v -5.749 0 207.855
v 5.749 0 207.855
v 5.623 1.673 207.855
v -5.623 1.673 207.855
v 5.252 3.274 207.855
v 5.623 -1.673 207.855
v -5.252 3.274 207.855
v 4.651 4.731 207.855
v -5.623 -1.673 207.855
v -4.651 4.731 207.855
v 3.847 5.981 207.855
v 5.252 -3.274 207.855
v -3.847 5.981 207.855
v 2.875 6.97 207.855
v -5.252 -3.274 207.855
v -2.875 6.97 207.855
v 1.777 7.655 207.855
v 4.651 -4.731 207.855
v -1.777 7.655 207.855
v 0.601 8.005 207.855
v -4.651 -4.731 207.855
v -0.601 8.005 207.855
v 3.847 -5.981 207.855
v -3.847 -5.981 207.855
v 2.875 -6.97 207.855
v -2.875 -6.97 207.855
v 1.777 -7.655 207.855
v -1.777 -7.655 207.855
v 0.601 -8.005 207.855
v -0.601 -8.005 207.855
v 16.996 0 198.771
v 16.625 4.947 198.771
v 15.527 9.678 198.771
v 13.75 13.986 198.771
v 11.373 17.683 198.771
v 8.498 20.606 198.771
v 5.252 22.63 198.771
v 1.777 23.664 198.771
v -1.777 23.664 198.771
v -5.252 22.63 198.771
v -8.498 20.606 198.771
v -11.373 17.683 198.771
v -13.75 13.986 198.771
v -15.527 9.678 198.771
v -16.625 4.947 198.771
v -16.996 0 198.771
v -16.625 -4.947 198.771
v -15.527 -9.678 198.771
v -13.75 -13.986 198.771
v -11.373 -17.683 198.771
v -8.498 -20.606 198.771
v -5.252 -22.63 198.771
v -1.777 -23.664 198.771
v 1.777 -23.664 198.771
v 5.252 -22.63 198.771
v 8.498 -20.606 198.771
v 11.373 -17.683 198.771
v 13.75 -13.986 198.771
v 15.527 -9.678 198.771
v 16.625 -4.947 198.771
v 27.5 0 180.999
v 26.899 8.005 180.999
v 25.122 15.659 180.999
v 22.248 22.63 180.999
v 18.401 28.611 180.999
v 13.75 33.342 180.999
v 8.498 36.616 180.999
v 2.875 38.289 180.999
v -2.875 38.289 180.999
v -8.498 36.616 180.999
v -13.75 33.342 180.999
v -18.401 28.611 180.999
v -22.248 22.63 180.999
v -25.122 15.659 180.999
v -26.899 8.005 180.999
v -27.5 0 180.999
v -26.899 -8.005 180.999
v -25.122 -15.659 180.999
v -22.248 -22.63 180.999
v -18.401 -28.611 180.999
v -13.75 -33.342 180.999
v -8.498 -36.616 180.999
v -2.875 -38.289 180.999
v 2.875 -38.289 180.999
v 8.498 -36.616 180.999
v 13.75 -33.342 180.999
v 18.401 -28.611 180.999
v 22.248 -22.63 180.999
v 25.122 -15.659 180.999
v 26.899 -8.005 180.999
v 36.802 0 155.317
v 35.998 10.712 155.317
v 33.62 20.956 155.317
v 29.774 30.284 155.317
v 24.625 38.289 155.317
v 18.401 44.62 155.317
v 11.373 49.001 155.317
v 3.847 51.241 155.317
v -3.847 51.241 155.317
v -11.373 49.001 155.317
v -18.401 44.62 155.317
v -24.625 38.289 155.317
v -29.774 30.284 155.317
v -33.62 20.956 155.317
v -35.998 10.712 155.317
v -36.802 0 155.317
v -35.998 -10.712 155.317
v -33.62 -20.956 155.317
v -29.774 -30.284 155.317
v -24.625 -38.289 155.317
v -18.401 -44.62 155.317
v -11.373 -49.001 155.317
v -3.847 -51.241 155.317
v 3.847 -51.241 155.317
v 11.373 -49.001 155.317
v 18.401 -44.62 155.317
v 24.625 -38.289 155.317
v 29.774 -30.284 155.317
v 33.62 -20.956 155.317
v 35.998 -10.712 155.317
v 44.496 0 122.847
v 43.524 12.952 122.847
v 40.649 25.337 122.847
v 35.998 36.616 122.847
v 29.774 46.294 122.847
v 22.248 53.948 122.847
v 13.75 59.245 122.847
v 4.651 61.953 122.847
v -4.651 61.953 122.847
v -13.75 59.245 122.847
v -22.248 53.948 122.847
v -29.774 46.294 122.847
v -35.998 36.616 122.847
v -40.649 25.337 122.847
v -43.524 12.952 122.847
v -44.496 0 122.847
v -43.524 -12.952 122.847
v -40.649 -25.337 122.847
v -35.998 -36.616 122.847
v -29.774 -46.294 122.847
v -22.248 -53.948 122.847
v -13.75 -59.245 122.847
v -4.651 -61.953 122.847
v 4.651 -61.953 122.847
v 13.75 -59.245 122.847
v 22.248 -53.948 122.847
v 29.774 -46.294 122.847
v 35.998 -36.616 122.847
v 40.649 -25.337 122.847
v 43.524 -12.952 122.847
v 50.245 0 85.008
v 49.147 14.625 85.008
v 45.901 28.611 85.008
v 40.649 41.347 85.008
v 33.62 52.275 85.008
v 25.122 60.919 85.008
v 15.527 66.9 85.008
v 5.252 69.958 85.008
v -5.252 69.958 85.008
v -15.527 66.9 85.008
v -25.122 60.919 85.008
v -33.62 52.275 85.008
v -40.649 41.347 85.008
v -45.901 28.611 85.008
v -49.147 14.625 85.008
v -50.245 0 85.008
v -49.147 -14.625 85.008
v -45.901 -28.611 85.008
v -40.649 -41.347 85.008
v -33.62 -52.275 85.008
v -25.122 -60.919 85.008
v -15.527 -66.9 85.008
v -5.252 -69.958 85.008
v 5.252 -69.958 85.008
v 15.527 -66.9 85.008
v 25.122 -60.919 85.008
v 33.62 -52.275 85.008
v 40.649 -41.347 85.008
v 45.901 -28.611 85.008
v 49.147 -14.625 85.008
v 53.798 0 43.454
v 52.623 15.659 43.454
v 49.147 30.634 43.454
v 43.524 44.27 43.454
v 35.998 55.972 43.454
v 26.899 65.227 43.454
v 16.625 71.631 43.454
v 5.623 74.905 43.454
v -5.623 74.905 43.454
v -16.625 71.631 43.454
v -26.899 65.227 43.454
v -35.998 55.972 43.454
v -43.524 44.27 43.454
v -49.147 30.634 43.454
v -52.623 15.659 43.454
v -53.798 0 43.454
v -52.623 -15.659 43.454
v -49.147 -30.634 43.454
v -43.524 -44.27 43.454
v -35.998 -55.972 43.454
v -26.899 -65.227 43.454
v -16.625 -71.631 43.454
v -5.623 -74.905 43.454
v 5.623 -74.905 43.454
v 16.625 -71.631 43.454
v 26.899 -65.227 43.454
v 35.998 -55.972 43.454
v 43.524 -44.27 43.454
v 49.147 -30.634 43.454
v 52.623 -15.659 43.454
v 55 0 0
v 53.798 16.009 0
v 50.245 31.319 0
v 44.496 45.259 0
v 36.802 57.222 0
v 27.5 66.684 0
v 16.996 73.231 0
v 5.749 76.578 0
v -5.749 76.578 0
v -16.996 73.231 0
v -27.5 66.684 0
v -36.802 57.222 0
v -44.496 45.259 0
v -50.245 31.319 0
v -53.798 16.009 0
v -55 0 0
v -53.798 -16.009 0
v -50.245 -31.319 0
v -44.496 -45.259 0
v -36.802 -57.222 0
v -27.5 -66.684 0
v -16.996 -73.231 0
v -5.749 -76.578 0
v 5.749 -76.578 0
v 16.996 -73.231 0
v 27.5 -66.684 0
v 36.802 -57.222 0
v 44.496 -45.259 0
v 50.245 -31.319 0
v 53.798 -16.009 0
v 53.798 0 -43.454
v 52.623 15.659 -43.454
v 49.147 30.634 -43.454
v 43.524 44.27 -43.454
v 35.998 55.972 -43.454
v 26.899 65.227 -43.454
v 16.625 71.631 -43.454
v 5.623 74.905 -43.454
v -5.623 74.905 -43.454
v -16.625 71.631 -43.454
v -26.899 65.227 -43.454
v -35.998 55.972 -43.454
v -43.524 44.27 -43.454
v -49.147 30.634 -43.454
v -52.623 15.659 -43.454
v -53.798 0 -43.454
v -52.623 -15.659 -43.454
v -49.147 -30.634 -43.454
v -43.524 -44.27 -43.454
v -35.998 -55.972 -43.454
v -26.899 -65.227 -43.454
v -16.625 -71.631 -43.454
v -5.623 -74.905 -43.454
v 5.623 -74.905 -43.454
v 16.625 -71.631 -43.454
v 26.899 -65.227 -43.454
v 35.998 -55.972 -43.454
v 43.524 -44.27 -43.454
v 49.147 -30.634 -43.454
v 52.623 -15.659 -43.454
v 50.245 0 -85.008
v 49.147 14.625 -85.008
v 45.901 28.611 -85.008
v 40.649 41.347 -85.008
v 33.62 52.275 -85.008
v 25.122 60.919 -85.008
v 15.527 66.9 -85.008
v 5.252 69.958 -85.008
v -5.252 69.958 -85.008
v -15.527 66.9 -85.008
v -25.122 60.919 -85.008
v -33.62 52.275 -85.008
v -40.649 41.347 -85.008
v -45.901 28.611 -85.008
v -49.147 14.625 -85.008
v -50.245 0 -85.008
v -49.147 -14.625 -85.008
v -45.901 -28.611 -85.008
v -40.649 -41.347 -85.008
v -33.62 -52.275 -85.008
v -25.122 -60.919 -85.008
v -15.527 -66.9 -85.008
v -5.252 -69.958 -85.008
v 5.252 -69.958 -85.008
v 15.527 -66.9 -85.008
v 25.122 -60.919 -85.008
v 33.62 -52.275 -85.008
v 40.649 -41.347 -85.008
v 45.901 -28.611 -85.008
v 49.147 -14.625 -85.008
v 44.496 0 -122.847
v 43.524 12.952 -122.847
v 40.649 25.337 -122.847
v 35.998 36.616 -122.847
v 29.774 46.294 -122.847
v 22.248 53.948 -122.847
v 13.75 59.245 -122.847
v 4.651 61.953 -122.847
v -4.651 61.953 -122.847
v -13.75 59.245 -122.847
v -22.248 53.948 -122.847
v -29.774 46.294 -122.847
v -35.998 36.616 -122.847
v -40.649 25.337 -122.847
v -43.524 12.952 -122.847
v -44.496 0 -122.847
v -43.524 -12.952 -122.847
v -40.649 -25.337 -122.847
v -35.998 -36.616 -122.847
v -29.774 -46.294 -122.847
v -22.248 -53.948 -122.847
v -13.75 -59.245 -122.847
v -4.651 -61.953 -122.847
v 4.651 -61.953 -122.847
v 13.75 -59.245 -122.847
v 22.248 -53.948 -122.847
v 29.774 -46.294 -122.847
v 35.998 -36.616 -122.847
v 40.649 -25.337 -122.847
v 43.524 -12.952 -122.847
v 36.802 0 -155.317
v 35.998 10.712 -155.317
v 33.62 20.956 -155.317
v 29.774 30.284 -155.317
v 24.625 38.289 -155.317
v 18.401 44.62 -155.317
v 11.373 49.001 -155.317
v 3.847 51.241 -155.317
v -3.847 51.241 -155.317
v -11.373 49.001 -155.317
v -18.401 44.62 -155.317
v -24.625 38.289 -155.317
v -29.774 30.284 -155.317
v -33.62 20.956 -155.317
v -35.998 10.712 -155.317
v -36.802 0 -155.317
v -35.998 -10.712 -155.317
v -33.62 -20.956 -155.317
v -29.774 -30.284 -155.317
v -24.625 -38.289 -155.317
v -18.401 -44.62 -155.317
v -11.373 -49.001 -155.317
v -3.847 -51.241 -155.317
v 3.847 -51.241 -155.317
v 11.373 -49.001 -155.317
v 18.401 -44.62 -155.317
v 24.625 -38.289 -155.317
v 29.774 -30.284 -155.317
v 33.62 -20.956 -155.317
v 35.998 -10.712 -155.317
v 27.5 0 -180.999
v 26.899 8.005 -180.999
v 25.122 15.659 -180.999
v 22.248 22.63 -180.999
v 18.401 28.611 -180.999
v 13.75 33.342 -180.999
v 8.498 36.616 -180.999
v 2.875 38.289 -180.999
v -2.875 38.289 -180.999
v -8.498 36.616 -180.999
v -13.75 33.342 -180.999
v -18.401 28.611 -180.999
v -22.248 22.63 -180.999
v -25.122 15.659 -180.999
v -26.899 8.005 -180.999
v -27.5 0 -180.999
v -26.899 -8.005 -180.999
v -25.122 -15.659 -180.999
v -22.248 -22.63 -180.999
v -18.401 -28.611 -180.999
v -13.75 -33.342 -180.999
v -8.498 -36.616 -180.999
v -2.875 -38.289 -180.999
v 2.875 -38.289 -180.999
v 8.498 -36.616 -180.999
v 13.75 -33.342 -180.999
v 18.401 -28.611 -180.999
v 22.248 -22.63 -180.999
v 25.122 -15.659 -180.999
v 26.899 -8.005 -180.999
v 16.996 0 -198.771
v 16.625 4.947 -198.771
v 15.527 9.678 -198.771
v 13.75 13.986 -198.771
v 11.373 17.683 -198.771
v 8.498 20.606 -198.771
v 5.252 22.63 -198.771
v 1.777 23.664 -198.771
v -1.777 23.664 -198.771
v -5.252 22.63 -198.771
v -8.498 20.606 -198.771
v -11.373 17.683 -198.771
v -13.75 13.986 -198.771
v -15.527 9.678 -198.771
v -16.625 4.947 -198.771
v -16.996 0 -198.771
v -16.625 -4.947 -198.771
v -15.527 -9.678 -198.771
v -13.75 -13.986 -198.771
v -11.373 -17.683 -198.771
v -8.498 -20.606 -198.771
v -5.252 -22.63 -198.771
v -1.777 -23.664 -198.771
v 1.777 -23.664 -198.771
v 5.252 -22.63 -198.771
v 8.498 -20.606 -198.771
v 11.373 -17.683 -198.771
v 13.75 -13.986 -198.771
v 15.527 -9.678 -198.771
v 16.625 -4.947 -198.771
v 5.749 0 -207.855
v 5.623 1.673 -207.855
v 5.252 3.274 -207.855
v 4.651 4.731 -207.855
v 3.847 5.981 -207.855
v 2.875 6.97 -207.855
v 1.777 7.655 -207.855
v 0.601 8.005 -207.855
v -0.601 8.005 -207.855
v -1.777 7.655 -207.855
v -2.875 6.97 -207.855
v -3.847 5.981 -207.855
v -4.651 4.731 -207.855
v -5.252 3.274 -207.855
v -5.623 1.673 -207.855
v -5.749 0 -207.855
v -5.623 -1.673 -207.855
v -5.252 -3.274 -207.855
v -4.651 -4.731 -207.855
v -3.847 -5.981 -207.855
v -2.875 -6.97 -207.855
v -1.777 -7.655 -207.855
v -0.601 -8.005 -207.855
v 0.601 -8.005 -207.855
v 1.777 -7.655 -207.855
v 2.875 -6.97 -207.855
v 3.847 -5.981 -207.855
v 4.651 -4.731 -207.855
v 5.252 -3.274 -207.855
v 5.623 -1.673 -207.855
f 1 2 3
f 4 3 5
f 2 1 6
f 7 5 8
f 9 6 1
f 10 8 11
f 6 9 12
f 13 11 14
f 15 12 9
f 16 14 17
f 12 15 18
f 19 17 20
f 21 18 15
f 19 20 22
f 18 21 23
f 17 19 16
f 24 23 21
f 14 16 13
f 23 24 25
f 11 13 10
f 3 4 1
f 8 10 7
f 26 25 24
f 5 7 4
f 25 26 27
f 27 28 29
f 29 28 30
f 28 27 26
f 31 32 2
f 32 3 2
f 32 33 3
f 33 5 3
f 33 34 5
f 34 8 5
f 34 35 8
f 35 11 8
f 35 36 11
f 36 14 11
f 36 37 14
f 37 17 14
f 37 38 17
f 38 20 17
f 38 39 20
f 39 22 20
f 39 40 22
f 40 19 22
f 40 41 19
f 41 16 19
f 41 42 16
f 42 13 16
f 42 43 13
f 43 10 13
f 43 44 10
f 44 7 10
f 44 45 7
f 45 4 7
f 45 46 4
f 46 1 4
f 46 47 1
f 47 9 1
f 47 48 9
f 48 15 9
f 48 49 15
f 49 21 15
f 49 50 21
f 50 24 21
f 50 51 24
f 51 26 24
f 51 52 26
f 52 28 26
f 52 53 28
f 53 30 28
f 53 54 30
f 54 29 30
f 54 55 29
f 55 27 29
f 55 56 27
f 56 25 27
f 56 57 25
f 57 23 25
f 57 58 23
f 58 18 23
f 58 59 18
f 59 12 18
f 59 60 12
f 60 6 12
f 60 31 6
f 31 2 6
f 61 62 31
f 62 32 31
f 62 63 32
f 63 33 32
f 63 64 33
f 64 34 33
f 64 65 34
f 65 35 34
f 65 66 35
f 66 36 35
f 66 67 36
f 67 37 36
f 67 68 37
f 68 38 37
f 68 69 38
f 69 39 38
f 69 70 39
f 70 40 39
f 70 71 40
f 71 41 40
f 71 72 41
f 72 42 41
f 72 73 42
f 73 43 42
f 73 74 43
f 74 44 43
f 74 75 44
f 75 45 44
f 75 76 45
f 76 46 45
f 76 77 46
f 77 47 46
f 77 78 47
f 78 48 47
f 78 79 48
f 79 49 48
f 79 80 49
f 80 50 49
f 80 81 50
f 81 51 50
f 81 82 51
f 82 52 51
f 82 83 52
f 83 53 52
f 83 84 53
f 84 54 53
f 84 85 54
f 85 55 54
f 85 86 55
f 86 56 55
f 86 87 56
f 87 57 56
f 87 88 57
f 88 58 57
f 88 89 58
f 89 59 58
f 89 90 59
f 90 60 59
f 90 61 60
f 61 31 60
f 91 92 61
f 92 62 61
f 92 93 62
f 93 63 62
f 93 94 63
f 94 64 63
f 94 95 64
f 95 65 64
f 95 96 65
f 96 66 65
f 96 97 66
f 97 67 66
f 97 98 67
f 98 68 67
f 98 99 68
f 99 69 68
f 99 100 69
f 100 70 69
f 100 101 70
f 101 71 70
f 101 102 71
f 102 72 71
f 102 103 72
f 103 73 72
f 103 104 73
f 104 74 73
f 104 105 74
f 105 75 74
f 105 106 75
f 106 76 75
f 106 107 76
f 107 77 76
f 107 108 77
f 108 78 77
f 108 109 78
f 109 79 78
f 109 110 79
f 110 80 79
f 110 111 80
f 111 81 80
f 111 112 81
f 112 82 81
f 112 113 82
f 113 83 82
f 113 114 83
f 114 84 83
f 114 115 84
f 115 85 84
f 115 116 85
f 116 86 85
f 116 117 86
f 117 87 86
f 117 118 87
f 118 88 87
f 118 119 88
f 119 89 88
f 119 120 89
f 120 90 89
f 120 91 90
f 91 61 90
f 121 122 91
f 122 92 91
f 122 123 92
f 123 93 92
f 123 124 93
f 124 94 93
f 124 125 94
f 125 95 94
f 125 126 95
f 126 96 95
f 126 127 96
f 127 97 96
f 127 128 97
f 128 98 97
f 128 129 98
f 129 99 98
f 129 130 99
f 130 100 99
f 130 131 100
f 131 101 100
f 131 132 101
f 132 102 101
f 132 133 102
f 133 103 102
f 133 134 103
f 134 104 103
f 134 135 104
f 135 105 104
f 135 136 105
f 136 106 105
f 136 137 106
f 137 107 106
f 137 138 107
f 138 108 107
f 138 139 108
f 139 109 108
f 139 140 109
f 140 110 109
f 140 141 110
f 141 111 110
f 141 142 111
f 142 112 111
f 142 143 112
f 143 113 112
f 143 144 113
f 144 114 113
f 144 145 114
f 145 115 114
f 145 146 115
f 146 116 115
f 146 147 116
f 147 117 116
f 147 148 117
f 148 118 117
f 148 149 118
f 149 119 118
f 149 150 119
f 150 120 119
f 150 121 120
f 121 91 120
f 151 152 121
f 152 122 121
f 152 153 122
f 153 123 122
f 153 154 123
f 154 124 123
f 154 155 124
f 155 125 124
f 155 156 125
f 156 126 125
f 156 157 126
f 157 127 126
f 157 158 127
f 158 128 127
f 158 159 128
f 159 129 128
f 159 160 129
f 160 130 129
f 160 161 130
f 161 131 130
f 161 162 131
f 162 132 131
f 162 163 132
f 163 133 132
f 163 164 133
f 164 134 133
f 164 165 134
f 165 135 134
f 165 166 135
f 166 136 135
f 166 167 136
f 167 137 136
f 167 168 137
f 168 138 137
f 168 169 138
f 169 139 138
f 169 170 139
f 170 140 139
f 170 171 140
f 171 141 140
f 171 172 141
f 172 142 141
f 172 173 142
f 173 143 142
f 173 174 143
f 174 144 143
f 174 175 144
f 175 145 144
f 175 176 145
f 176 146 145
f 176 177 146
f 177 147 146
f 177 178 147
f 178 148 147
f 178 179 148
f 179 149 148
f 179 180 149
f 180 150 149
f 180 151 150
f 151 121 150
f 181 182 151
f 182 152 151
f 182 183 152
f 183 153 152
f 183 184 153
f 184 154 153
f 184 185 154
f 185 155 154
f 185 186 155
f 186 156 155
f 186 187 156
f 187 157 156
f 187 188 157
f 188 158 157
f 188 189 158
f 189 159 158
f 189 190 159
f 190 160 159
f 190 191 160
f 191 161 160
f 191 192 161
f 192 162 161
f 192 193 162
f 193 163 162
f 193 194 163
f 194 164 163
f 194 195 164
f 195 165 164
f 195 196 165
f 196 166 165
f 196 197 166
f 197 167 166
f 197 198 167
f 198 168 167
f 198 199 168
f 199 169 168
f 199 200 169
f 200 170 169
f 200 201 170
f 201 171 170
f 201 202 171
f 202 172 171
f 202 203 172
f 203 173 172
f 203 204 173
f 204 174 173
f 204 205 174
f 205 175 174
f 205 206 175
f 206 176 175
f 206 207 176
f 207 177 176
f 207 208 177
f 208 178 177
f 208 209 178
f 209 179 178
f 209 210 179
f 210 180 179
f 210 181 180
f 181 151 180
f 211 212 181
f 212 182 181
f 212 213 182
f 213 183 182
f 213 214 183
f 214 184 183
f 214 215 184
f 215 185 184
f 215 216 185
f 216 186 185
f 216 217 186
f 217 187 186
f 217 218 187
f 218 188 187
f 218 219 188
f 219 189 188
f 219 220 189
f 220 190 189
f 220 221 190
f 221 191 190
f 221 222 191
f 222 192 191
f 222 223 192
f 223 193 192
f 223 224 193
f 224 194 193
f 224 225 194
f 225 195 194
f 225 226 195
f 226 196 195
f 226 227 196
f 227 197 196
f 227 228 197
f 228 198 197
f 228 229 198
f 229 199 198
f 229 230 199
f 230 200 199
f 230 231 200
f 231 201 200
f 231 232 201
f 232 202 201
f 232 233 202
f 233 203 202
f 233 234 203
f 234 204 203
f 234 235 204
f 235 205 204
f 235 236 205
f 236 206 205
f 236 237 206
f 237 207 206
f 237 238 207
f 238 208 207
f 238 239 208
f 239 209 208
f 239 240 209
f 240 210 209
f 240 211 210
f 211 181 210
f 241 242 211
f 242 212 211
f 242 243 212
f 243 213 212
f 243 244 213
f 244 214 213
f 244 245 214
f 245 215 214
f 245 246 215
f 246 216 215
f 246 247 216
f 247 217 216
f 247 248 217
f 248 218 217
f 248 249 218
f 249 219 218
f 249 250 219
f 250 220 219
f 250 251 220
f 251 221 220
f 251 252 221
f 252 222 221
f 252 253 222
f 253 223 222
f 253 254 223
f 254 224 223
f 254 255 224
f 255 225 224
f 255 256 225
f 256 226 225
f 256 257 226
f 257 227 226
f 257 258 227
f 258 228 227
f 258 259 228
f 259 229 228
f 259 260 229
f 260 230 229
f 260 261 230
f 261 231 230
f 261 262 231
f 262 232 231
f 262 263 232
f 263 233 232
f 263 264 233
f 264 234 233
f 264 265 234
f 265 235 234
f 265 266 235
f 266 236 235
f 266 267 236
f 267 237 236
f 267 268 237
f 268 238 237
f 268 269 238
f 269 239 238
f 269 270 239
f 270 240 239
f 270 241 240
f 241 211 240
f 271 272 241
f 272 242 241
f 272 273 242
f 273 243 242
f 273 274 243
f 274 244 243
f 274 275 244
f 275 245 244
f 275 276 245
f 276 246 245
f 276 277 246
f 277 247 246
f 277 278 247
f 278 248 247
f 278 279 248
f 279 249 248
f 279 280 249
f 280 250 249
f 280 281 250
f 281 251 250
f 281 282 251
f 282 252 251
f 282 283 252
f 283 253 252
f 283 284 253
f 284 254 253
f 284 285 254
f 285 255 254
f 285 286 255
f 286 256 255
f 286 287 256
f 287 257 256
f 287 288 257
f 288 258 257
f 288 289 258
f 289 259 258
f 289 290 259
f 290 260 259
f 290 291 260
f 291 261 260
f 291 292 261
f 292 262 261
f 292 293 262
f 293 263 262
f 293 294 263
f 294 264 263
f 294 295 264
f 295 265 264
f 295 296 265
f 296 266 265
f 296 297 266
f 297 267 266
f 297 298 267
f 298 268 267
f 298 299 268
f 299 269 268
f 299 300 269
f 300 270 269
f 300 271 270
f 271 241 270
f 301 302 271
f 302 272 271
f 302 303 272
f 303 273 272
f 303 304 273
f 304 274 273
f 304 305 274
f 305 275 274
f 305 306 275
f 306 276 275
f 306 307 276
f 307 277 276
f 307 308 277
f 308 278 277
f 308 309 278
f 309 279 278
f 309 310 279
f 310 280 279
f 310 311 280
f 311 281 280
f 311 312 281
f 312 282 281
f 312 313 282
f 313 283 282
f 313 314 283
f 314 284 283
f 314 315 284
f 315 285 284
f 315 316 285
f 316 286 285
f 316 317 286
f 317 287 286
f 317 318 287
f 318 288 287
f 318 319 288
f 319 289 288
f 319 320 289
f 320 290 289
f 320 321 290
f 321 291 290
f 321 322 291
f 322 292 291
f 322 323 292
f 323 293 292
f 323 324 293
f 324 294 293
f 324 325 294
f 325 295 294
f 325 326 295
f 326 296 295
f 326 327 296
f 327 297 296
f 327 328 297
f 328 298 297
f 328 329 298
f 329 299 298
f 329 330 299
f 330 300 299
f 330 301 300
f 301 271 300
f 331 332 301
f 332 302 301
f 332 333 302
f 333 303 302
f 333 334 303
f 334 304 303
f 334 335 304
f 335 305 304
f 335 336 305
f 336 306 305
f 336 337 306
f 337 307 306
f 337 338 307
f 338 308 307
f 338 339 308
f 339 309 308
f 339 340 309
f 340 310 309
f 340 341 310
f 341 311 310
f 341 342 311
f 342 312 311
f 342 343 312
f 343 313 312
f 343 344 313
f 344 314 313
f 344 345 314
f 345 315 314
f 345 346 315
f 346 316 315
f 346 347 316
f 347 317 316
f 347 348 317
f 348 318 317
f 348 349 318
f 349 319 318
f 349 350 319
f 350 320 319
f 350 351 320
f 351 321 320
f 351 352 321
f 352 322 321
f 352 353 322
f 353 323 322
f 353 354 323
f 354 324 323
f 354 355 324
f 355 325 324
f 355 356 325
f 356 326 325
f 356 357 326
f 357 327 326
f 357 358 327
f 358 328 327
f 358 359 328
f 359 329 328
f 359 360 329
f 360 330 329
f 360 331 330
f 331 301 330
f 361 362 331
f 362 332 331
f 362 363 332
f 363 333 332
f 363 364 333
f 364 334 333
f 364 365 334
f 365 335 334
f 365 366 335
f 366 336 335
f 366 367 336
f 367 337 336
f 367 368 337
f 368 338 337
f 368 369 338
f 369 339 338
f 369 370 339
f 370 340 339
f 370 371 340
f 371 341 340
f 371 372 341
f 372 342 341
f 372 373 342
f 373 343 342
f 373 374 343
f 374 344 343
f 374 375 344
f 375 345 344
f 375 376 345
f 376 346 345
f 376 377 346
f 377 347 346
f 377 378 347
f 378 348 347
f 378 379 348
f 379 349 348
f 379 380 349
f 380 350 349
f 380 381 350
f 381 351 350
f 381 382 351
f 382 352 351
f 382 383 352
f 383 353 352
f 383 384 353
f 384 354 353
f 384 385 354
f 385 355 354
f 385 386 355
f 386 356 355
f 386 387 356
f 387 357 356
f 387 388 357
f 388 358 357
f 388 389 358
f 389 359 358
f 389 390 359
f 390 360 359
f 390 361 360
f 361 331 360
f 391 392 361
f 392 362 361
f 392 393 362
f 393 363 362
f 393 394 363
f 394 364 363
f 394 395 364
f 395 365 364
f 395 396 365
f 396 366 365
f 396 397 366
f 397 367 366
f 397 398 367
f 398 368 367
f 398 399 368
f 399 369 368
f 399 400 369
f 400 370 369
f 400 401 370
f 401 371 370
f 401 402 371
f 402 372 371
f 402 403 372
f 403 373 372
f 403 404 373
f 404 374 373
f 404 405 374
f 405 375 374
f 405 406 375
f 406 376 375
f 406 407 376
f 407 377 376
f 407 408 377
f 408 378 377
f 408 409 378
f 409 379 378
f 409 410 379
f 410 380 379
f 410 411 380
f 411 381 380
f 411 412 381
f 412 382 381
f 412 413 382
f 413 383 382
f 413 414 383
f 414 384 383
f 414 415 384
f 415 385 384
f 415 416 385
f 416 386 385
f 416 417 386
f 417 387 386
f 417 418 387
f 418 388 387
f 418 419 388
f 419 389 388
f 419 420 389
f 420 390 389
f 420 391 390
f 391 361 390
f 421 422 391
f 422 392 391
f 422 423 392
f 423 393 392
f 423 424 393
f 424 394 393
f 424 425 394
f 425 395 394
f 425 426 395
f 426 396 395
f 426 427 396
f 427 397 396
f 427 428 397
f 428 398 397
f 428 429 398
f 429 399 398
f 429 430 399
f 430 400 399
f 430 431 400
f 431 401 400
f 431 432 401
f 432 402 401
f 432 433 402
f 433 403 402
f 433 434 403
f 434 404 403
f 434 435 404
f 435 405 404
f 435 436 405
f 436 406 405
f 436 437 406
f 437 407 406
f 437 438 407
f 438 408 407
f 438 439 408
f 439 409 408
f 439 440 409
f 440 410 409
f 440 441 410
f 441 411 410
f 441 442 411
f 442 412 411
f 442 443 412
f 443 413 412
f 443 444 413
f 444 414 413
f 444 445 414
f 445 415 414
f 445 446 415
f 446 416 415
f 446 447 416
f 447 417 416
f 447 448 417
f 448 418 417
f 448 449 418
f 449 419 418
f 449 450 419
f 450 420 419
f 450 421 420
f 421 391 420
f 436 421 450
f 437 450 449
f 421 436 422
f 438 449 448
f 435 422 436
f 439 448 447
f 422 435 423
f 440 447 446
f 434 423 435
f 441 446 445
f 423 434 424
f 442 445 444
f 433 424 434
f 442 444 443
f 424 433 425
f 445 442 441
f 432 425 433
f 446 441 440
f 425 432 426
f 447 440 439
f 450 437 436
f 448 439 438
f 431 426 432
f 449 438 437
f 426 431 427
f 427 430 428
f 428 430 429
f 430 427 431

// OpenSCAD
// Generated by SolidPython 1.0.1 on 2020-07-29 00:46:46


scale(v = [5, 7, 19]) {
	sphere(r = 11);
}
/***********************************************
*********      SolidPython code:      **********
************************************************
 
# import packages: SolidPython
from solid import *
from solid.utils import *
from itertools import chain, combinations, permutations


class Resize:

    def __init__(self, scad_file):
        self.scad_file = scad_file
        #self.scad_file = import_scad(scad_file)
        # cone/cylinder param:
        self.r1 = 0
        self.r2 = 0
        self.h = 0
        # rectangular prism param:
        self.w = 0
        self.l = 0
        # ellipse param:
        self.r = 0

    # import OpenScad code (file name corresponds to shape)


    # classify shape + parameters
    def assign(self, param1, param2, param3):
        if self.scad_file == 'cone.scad':
            self.r1 = param1
            self.r2 = param2
            self.h = param3
        elif self.scad_file == 'cylinder.scad':
            self.r1 = param1
            self.r2 = param2
            self.h = param3
        elif self.scad_file == 'rectangularPrism.scad':
            self.h = param1
            self.l = param2
            self.w = param3
        else:
            self.r = param1
            self.h = param2

    # resize parameters
    def iterate(self):
        x = range(3, 20, 2)
        i = 1
        if self.scad_file == 'cone.scad':
            tempList = list(permutations(x, 2))
            for temp in tempList:
                param1 = temp[0]
                param2 = temp[1]
                filepath = 'produced_scad_files/' + 'cone' + str(param1) + '_' + str(param2) + '_' + '.scad'
                scad_render_to_file(cylinder(h=param1, r1=param2, r2=0), filepath)

        elif self.scad_file == 'cylinder.scad':
            tempList = list(permutations(x, 3))
            for temp in tempList:
                param1 = temp[0]
                param2 = temp[1]
                filepath = 'produced_scad_files/' + 'cylinder' + str(param1) + '_' + str(param2) + '_' + '.scad'
                scad_render_to_file(cylinder(h=param1, r1=param2, r2=param2), filepath)

        elif self.scad_file == 'rectangularPrism.scad':
            tempList = list(permutations(x, 3))
            for temp in tempList:
                param1 = temp[0]
                param2 = temp[1]
                param3 = temp[2]
                filepath = 'produced_scad_files/' + 'rectangularPrism' + str(param1) + '_' + str(param2) + '_' + str(
                    param3) + '.scad'
                scad_render_to_file(cube(size=(param1, param2, param3)), filepath)

        elif self.scad_file == 'ellipse.scad':
            tempList = list(permutations(x, 4))
            for temp in tempList:
                param1 = temp[0]
                param2 = temp[1]
                param3 = temp[2]
                param4 = temp[3]
                filepath = 'produced_scad_files/' + 'ellipse' + str(param1) + '_' + str(param2) + '_' + str(param3) + '_' + str(param4) + '.scad'
                scad_render_to_file(scale([param1, param2, param3])(sphere(r=param4)), filepath)

    def render_to_scadfile(self):
        scad_render_to_file(scad, 'example.scad') 
 
************************************************/
